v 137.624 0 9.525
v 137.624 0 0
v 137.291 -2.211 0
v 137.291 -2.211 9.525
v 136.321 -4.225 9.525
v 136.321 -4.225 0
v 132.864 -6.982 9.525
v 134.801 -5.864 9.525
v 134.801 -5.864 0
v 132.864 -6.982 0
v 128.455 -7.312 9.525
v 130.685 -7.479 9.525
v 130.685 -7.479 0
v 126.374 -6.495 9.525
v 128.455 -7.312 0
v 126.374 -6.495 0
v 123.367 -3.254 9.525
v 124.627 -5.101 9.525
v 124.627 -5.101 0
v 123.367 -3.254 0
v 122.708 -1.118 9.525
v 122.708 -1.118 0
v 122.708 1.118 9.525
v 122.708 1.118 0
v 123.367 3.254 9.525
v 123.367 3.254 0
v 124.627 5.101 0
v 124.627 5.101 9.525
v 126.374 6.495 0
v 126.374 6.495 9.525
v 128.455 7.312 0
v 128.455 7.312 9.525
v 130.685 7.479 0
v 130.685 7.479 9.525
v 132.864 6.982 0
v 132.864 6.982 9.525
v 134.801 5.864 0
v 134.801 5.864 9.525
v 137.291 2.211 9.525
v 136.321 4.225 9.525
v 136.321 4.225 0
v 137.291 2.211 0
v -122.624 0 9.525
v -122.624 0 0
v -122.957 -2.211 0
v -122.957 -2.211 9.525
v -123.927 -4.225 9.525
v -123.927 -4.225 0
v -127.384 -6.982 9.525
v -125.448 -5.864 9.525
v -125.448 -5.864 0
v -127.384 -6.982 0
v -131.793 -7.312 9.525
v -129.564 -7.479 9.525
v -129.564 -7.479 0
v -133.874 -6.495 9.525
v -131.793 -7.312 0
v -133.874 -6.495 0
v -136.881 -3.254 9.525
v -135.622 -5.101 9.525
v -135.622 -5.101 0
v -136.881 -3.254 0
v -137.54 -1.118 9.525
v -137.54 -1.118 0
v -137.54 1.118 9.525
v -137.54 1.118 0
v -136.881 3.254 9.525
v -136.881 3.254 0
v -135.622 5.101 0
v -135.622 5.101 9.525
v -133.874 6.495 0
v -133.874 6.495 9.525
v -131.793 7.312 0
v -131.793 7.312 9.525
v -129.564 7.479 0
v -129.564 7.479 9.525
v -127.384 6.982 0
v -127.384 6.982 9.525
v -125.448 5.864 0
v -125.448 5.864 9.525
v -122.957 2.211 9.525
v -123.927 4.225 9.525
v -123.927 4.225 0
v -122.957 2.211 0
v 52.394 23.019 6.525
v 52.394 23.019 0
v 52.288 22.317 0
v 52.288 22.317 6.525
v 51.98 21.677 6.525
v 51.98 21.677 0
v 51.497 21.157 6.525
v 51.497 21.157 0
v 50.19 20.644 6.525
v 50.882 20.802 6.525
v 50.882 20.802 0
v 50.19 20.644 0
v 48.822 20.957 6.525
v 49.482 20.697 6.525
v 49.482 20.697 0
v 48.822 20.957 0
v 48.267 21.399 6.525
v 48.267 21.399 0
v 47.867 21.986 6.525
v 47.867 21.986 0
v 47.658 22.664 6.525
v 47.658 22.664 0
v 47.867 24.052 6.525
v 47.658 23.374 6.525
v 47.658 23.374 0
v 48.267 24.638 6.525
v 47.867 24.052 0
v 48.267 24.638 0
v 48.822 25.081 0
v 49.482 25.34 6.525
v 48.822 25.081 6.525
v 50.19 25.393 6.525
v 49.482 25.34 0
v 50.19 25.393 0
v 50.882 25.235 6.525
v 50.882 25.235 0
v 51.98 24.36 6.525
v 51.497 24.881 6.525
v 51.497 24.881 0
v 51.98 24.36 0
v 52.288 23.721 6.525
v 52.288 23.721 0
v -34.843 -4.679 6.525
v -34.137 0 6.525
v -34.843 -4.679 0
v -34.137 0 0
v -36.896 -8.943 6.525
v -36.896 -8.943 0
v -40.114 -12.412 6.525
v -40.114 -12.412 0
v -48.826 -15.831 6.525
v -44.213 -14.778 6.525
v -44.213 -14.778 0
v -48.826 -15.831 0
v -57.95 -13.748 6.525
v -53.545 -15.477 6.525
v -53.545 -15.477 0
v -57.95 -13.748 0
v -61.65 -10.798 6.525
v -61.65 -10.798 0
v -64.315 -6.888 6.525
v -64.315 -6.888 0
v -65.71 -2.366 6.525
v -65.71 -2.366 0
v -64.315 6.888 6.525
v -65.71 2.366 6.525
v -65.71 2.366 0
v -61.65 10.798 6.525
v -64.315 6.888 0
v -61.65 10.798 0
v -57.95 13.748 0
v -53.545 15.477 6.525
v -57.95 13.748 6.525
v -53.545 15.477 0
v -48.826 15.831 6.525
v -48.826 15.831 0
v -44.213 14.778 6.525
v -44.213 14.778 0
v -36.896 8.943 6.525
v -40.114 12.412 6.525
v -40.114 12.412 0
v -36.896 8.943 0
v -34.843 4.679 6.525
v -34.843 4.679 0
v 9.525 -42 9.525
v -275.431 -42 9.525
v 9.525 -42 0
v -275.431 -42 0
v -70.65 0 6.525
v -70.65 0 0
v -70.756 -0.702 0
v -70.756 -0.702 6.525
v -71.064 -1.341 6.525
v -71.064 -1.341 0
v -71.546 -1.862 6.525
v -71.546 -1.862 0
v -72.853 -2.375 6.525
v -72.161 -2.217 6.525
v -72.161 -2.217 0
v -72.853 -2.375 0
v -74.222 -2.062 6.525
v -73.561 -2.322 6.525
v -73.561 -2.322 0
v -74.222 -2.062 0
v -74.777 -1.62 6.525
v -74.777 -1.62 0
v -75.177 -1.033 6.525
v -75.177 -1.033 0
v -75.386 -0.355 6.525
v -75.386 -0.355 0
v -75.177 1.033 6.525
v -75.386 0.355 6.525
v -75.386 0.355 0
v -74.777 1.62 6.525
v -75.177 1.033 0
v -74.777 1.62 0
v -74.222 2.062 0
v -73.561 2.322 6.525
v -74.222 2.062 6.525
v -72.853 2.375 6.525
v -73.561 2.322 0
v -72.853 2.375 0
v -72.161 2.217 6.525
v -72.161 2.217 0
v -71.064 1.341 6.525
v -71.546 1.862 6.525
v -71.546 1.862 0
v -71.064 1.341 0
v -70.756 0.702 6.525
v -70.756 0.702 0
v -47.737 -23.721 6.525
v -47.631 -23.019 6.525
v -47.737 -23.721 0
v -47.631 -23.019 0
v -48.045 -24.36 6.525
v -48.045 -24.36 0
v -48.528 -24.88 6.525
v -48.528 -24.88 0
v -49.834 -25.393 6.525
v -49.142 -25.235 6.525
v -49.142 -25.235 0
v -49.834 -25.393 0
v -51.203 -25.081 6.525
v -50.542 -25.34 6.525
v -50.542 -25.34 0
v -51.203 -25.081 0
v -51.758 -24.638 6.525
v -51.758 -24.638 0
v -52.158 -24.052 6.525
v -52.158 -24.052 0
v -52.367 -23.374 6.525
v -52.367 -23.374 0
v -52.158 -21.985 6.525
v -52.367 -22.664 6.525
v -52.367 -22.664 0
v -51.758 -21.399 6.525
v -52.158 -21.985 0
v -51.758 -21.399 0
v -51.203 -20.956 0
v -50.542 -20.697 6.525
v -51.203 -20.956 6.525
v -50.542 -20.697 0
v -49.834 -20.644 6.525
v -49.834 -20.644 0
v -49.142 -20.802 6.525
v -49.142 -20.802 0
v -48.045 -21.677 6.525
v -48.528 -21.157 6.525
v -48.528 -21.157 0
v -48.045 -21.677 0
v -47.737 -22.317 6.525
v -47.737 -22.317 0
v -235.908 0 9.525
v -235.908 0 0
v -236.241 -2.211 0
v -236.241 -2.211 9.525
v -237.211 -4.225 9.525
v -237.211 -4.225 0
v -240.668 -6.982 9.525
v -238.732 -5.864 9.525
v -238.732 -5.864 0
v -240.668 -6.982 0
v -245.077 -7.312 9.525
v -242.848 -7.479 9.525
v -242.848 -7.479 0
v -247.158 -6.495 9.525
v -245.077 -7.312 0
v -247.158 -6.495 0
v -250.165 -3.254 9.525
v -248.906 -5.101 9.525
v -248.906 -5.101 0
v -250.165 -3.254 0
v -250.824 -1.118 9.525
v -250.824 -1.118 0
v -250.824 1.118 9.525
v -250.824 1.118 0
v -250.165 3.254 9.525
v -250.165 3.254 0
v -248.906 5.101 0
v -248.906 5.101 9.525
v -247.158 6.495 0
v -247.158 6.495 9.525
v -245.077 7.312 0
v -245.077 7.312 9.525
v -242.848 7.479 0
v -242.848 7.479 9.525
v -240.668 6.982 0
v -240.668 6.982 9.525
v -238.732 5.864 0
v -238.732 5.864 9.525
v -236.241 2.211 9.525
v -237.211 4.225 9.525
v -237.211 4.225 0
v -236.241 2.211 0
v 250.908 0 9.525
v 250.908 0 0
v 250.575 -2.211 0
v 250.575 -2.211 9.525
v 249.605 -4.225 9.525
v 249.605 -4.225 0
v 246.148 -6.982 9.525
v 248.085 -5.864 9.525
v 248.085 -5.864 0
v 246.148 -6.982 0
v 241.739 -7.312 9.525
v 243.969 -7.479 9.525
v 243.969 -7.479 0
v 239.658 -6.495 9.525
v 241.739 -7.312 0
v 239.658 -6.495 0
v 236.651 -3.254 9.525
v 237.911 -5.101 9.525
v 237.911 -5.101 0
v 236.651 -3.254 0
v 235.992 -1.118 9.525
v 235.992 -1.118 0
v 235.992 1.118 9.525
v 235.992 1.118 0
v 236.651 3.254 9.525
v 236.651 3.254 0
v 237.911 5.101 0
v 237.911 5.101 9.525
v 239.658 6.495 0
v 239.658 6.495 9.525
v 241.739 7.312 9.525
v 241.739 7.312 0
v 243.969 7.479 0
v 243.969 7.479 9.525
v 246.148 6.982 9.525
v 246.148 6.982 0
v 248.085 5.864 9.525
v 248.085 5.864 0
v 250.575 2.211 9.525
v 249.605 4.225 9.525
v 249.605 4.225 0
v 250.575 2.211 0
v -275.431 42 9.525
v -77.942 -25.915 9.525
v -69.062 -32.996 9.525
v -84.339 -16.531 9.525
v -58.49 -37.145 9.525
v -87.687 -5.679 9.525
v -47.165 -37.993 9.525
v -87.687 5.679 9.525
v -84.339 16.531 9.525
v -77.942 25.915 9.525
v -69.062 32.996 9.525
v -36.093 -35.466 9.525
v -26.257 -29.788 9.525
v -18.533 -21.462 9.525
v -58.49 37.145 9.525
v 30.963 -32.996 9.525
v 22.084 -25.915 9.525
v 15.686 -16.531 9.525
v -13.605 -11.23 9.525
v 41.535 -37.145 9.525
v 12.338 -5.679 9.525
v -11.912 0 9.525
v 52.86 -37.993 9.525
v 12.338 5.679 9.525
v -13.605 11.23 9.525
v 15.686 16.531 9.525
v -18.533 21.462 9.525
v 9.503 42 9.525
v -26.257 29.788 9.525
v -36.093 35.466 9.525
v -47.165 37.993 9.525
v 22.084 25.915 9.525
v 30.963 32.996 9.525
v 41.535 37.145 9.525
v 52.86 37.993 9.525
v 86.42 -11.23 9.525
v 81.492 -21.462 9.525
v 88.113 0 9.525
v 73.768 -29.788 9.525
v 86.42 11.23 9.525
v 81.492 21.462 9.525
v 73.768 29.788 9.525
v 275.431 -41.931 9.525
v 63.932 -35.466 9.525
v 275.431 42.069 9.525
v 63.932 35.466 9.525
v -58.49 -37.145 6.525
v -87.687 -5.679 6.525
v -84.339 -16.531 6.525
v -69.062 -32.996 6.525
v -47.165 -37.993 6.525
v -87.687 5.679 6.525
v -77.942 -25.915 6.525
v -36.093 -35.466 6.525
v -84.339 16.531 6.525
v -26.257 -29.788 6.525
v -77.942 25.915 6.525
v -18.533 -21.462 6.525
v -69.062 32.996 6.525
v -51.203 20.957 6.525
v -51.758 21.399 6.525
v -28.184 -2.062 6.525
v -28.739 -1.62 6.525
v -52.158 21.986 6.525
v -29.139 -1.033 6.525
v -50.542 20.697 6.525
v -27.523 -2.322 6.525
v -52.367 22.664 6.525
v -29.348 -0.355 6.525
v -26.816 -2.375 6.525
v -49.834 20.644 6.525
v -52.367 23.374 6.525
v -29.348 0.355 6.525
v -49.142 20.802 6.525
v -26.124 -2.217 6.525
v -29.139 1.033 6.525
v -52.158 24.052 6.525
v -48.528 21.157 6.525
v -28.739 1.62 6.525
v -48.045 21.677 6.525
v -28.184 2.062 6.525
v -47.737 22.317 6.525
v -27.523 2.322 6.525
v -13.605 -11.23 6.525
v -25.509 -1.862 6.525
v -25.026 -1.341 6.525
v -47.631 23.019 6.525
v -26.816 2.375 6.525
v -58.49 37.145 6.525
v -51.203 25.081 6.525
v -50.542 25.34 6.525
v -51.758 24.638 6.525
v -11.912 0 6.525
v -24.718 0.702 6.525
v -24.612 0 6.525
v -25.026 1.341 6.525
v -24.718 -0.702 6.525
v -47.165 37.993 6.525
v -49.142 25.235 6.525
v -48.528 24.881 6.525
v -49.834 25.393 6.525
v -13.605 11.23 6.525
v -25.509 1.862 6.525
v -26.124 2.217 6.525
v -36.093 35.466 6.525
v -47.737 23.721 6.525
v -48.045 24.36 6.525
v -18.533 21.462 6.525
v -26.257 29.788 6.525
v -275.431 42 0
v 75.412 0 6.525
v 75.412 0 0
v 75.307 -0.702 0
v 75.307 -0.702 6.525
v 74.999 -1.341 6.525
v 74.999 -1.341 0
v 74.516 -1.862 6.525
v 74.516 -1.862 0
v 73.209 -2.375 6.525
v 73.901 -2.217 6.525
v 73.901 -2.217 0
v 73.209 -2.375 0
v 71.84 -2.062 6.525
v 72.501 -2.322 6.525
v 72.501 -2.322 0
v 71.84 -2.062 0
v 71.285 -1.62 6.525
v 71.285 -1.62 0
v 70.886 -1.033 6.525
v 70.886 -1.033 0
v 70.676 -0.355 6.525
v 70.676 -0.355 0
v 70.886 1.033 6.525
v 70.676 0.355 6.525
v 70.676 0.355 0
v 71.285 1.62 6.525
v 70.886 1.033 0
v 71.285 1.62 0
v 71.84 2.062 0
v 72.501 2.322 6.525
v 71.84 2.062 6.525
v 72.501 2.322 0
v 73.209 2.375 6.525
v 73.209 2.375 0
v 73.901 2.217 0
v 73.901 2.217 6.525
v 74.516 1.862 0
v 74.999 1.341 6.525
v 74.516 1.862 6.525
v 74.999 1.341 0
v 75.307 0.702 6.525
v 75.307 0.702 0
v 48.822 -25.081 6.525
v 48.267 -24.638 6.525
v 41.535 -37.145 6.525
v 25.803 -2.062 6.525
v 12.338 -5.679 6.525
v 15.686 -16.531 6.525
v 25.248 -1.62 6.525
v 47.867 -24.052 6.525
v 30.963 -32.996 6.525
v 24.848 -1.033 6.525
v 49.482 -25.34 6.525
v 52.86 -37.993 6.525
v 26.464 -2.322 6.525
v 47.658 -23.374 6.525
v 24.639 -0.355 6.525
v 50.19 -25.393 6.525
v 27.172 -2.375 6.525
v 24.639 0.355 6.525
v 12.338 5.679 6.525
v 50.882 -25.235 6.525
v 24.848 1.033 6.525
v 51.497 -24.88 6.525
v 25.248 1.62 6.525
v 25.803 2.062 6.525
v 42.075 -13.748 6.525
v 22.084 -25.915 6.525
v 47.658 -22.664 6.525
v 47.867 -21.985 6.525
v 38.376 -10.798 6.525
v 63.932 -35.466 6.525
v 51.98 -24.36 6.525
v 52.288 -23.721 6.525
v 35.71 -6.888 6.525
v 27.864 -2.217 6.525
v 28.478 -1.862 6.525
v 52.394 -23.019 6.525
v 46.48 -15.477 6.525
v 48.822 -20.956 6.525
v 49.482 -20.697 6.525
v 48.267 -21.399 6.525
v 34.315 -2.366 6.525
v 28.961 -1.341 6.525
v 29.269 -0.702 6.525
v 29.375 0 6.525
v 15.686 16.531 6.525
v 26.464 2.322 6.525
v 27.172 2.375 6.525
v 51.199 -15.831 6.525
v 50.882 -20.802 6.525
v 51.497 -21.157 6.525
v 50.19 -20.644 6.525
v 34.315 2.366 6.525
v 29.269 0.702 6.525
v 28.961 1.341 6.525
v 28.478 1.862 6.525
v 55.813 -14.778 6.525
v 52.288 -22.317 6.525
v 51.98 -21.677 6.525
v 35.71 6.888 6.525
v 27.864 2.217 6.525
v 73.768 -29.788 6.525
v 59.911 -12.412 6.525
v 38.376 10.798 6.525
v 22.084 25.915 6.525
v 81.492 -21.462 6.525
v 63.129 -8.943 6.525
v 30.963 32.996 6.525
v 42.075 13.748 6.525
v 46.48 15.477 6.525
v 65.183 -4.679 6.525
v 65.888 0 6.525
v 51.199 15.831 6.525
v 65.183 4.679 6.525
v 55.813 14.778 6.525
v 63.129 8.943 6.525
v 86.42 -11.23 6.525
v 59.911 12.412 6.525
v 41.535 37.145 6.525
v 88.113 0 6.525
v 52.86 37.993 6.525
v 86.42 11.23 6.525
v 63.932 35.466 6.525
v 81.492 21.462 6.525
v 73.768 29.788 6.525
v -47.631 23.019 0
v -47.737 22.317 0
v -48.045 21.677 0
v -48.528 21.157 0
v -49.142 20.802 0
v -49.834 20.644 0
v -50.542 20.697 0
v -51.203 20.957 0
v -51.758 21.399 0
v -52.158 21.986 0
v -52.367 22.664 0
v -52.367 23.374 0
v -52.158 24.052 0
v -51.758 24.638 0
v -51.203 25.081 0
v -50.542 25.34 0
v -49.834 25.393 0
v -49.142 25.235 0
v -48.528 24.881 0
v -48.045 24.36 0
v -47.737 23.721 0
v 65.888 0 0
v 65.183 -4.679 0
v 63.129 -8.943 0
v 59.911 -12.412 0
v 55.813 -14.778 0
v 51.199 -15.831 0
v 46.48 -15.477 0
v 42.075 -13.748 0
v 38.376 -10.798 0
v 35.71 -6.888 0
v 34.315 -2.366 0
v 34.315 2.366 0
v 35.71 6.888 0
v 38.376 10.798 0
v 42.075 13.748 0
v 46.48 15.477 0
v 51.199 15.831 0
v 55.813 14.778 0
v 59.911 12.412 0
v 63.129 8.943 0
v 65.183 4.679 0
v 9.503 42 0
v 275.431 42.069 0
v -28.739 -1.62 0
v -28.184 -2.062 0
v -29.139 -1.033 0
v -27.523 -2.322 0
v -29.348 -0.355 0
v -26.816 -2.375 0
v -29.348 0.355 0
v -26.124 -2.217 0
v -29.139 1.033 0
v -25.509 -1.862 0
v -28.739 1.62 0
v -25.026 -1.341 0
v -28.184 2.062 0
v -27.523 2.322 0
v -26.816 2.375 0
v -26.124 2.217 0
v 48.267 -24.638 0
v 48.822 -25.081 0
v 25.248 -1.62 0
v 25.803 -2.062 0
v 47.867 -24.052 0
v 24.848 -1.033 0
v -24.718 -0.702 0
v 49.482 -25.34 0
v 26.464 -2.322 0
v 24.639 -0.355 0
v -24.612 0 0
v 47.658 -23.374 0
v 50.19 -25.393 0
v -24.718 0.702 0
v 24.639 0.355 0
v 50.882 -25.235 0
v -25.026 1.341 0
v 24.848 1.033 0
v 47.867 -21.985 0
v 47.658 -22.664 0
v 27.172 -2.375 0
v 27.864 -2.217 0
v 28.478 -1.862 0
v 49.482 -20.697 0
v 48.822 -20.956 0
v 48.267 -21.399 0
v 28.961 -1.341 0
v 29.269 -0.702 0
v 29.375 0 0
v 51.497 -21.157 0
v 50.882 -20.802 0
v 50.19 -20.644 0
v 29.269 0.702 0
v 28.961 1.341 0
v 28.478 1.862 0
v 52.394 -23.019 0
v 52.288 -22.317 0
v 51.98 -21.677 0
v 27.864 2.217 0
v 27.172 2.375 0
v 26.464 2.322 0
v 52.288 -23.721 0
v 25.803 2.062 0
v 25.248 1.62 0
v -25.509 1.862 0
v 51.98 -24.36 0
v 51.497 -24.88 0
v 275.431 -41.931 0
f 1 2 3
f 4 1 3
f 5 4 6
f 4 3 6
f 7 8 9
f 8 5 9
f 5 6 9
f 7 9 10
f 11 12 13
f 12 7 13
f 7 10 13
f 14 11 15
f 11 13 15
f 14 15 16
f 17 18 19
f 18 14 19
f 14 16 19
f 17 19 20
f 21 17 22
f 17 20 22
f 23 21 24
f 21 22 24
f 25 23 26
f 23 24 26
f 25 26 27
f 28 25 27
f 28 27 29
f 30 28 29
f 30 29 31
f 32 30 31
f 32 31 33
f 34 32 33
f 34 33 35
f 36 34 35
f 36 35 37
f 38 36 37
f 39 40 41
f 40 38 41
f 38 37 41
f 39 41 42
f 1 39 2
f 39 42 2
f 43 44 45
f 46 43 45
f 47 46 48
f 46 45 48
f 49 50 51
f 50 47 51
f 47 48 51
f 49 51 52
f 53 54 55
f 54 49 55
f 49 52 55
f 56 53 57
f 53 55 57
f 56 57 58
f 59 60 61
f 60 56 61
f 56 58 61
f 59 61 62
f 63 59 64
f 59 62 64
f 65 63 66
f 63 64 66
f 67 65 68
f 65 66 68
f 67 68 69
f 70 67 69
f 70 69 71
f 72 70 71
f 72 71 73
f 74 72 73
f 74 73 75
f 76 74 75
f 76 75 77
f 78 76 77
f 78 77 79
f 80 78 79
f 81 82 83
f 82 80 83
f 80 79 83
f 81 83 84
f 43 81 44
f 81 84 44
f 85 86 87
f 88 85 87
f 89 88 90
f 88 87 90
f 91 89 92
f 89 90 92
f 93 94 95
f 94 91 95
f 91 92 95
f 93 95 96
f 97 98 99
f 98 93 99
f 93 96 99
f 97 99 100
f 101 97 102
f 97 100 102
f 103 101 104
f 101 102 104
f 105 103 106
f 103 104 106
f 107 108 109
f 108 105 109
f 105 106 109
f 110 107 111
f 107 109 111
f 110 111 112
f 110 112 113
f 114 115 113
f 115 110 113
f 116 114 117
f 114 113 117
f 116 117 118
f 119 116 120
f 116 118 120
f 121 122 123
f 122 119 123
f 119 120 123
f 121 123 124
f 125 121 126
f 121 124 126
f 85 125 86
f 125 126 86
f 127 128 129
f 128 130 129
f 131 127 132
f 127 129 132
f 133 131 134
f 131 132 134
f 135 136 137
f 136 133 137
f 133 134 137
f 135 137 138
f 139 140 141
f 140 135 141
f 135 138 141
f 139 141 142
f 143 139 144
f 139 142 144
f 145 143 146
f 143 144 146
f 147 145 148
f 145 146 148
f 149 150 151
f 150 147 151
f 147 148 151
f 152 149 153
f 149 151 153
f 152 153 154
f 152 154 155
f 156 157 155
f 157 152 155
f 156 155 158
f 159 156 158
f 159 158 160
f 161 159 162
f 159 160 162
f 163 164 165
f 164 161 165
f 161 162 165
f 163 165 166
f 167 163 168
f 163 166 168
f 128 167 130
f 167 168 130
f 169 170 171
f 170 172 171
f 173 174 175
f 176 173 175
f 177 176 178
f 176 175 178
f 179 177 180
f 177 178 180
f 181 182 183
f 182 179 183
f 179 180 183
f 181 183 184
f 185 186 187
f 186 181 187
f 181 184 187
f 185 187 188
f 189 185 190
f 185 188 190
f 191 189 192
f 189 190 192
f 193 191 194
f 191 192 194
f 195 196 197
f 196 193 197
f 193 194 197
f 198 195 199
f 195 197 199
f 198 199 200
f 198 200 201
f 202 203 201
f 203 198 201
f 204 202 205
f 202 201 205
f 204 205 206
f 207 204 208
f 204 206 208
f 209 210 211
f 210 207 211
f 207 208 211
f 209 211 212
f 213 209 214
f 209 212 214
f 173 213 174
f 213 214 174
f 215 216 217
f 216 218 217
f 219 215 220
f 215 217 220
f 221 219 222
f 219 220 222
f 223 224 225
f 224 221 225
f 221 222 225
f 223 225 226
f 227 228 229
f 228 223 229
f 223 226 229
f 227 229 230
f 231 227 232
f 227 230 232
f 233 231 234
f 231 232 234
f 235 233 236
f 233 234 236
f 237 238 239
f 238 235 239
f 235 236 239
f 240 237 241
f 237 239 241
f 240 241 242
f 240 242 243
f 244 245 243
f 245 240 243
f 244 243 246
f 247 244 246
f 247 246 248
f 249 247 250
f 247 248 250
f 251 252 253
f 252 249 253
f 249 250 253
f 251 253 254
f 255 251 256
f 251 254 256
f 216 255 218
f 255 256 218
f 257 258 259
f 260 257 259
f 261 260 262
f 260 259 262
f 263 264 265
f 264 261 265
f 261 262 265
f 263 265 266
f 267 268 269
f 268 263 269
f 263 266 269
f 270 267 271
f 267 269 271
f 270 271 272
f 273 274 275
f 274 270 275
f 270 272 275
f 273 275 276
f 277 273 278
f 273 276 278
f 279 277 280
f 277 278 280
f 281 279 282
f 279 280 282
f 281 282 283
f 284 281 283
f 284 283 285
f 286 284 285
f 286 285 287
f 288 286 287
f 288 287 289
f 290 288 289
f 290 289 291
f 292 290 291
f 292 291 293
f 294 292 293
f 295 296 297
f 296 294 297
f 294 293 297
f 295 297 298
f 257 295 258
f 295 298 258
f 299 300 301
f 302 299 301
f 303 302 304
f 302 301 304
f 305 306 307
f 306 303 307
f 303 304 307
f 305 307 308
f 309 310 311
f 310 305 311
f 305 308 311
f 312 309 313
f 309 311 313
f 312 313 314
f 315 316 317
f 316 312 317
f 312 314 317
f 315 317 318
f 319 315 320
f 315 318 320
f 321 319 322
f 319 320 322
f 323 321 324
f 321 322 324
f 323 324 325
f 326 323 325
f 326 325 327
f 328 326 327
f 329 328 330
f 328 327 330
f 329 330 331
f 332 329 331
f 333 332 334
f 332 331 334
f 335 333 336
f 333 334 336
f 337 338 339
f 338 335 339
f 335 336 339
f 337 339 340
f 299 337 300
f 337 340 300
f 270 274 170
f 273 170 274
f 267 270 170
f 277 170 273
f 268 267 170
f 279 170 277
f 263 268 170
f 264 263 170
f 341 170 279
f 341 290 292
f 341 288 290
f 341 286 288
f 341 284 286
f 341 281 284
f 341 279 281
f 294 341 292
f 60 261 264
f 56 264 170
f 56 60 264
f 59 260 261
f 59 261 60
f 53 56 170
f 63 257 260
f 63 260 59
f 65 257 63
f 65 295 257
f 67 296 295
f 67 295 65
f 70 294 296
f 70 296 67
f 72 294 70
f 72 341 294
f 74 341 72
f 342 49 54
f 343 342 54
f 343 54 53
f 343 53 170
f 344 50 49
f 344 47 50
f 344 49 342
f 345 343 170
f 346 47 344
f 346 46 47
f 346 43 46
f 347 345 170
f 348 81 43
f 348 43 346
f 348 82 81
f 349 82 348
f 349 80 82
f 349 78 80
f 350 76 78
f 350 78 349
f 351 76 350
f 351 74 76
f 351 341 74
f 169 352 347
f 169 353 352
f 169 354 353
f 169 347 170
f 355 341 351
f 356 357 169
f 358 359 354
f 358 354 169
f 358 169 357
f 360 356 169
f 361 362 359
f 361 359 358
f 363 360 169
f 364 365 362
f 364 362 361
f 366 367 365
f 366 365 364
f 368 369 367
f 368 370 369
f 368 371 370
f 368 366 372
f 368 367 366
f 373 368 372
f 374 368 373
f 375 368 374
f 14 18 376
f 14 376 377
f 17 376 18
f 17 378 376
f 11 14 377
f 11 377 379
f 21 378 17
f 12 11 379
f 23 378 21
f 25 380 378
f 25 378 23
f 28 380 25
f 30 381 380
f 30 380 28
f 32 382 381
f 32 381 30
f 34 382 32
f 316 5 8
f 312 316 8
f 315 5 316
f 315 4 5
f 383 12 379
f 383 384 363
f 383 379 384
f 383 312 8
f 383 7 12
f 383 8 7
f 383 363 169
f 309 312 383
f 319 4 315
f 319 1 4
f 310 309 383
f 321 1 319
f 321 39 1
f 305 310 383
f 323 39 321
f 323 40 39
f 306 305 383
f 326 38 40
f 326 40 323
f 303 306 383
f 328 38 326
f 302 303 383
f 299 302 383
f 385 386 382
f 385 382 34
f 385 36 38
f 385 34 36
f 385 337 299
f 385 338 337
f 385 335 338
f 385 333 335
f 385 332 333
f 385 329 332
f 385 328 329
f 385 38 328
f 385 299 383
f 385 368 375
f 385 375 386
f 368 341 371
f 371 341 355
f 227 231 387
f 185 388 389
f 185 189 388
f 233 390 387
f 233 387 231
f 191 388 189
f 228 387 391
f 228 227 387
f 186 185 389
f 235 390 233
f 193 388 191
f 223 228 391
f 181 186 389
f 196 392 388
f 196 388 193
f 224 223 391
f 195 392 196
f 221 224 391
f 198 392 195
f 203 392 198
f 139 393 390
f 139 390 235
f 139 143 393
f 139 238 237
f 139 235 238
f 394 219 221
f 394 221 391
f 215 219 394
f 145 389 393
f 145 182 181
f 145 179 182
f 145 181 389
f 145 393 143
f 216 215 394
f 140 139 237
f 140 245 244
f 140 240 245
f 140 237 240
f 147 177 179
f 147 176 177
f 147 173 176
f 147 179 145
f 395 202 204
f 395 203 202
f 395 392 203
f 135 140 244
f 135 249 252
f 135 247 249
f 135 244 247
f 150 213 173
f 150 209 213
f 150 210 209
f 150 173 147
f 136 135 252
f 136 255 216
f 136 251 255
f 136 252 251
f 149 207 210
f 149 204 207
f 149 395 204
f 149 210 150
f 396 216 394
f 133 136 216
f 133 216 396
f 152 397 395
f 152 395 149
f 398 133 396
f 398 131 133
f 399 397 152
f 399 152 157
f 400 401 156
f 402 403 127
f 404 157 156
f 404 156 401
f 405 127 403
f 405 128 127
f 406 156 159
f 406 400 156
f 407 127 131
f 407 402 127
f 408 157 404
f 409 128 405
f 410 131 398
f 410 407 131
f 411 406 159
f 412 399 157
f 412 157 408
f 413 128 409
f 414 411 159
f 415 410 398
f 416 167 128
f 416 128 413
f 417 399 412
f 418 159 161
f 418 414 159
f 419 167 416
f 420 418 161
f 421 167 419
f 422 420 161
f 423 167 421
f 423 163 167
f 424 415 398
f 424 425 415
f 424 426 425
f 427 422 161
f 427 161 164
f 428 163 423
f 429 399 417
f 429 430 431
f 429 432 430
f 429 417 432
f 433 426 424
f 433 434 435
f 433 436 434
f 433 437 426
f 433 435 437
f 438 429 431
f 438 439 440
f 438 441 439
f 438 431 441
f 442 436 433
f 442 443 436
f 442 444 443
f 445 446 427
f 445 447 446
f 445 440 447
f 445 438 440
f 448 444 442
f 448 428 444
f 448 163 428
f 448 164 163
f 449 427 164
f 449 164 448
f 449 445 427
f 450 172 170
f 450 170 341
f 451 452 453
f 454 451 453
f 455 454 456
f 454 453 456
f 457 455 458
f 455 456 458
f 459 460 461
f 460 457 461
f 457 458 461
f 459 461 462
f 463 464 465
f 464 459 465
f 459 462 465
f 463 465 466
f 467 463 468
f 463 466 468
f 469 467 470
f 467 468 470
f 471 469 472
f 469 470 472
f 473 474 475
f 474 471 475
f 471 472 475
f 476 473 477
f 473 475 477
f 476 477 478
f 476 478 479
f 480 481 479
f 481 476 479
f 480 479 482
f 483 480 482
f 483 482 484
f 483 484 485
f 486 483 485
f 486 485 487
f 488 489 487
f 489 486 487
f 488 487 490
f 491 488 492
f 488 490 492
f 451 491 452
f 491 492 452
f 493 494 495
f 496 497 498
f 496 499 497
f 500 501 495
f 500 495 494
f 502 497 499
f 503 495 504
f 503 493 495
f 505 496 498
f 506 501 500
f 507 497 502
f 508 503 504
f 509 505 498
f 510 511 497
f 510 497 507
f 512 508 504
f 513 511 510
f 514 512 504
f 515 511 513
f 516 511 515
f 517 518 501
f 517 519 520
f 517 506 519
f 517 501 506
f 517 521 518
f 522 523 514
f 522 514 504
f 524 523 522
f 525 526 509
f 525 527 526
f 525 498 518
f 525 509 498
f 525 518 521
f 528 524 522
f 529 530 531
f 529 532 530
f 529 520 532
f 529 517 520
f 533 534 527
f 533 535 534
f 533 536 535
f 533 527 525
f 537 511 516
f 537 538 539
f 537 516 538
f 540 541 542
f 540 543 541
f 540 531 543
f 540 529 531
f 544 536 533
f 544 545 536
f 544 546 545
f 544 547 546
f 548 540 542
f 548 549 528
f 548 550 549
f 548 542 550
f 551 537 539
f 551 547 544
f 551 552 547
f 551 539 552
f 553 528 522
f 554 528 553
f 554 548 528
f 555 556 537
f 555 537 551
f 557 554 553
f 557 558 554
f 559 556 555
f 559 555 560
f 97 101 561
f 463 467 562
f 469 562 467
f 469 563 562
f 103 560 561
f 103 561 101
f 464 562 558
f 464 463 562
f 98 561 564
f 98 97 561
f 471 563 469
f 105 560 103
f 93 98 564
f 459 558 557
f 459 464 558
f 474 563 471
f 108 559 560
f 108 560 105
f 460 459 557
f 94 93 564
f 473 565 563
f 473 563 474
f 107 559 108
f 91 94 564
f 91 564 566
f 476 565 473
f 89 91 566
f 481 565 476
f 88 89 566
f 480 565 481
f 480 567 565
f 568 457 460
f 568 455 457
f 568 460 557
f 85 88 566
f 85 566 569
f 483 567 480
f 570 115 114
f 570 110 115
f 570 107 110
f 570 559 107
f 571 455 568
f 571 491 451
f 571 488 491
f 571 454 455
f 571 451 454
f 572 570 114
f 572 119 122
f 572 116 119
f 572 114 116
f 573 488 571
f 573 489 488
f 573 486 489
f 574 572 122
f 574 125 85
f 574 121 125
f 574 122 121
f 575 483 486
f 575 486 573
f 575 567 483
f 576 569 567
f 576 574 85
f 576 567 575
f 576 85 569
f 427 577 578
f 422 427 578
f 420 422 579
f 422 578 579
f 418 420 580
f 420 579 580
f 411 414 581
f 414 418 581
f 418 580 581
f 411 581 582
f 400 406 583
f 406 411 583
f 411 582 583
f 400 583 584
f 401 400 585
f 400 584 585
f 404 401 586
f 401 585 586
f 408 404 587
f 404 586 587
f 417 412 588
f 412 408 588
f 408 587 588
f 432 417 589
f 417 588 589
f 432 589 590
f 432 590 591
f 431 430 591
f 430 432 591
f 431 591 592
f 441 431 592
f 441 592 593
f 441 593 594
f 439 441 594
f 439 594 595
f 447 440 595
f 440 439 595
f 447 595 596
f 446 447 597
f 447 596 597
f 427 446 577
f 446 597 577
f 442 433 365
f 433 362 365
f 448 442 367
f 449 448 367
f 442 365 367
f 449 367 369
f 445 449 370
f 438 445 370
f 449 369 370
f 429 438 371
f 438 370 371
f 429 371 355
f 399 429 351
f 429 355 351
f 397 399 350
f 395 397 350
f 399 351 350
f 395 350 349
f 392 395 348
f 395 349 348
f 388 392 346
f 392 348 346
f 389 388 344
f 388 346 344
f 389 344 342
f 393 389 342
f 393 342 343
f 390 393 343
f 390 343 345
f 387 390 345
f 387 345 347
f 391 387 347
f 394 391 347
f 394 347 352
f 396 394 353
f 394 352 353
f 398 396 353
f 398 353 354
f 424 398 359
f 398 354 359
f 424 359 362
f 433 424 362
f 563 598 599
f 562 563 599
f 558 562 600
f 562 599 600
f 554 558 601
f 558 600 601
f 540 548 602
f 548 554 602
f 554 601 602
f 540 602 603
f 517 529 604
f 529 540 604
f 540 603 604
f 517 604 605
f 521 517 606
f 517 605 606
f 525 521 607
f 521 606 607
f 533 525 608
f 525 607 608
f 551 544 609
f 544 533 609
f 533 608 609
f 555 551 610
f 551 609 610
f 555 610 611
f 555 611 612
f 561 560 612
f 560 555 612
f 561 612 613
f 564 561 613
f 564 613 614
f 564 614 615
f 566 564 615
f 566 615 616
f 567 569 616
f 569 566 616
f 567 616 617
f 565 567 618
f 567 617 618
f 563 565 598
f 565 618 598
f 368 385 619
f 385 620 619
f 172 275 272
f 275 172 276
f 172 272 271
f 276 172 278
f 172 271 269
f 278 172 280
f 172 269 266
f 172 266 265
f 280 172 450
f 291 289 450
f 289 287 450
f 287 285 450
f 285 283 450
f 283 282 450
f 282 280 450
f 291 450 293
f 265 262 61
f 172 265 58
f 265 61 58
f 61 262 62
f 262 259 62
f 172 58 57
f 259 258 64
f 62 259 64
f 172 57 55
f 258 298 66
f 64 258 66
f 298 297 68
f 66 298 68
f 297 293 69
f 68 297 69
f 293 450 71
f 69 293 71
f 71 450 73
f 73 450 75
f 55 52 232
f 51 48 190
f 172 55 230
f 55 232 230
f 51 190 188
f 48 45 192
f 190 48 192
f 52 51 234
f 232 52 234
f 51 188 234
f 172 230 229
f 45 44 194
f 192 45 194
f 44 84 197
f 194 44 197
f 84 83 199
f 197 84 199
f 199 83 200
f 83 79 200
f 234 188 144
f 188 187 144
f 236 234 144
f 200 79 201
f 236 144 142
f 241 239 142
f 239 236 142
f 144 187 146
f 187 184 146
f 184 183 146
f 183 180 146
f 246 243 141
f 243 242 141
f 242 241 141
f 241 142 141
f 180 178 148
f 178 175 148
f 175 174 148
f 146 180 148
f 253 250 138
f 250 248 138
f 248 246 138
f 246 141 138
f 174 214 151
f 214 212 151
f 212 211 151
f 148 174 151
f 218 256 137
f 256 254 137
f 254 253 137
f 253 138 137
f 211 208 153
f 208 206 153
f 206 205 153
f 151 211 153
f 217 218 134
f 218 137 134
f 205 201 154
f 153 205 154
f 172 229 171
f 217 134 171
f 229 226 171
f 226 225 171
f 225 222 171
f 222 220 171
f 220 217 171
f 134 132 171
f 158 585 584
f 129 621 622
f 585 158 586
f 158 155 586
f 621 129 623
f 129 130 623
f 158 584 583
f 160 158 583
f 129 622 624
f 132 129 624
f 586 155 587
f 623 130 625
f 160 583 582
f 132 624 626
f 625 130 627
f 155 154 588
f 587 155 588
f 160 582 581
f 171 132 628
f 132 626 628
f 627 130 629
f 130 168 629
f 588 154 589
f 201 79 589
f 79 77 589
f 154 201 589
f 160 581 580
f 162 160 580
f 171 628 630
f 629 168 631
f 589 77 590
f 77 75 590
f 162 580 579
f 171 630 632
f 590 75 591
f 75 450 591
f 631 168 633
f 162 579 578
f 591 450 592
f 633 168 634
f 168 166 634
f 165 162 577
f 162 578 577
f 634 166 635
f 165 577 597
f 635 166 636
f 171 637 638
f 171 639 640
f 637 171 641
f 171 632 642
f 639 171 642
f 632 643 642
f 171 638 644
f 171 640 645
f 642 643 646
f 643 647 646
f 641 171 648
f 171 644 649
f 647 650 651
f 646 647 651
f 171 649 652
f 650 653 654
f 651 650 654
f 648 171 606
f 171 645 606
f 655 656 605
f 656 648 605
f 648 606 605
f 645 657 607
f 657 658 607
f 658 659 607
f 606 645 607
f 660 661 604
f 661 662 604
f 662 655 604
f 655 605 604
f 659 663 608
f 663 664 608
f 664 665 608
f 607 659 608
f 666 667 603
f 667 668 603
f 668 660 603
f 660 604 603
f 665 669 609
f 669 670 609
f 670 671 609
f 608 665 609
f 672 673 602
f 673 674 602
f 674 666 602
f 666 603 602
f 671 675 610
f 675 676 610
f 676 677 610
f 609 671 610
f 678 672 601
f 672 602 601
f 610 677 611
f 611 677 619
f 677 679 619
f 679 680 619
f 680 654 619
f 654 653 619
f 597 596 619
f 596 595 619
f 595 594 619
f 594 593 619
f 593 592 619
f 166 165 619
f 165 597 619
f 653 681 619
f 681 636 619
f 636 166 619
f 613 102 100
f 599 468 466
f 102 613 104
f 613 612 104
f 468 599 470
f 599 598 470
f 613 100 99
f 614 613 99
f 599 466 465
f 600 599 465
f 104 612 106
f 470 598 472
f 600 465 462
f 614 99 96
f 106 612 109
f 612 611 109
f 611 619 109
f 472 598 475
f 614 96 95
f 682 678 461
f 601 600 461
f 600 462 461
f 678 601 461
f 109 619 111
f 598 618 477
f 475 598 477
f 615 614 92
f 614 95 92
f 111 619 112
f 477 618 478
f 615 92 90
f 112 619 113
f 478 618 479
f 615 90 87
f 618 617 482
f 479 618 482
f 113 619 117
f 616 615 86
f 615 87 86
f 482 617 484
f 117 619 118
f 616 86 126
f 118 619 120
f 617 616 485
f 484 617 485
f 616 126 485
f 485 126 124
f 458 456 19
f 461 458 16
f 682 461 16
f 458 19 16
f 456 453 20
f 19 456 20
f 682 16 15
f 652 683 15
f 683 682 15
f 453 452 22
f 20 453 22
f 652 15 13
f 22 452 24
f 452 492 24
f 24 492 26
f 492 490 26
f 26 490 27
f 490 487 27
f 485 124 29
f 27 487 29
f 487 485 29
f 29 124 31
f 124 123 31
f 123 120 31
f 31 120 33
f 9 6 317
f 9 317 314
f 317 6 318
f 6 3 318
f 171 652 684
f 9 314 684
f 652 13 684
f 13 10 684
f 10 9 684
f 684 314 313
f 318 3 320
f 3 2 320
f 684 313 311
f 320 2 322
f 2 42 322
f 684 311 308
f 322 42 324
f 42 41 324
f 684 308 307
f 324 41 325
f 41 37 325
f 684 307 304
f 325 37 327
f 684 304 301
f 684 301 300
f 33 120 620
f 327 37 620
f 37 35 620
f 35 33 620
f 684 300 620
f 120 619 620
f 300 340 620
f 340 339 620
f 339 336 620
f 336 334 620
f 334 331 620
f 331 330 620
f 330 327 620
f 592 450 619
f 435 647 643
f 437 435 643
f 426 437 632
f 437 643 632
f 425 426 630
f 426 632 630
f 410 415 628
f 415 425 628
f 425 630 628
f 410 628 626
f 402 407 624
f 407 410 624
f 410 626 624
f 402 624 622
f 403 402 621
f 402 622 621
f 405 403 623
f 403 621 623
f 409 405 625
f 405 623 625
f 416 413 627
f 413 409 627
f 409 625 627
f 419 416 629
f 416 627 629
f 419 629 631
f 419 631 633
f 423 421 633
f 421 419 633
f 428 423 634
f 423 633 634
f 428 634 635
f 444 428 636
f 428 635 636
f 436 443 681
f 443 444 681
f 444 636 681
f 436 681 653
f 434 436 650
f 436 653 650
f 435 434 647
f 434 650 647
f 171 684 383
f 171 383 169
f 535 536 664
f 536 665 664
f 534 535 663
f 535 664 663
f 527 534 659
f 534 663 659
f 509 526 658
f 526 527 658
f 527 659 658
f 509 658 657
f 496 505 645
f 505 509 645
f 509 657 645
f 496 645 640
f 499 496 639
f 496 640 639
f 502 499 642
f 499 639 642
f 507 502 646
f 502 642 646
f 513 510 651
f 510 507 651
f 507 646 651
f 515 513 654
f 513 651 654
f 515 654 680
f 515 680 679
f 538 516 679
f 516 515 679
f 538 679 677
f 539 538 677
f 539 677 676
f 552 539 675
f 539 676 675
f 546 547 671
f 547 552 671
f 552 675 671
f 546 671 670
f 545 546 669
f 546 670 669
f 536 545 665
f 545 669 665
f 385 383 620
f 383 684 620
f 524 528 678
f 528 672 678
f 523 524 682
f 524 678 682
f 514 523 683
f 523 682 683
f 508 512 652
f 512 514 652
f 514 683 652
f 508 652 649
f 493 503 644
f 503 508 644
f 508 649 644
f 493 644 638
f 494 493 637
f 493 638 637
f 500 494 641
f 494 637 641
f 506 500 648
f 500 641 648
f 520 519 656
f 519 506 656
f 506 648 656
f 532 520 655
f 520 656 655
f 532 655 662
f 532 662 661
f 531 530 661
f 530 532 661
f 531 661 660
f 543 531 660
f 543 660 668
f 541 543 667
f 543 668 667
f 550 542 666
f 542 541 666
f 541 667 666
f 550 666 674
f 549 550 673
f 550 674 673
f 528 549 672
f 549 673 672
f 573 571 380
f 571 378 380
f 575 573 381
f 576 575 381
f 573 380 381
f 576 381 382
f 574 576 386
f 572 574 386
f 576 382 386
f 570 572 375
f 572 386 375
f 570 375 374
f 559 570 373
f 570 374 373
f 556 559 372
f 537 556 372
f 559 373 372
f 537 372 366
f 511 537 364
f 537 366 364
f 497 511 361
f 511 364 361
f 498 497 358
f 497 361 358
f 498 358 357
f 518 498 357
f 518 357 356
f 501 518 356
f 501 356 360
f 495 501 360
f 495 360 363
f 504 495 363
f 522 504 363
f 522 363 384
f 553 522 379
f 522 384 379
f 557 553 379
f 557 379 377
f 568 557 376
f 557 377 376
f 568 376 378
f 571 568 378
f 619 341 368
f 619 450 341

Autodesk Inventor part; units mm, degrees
ref_plane "YZ Plane" through (0, 0, 0) normal (1, 0, 0) x (0, 1, 0)
ref_plane "XZ Plane" through (0, 0, 0) normal (0, 1, 0) x (-1, 0, 0)
ref_plane "XY Plane" through (0, 0, 0) normal (0, 0, 1) x (1, 0, 0)
sketch "Sketch1" plane through (0, 0, 0) normal (0, 0, 1) x (1, 0, 0)
  line L0 (-275.4313, -42) -> (-275.4313, 42)
  circle A0 centre (-243.408, 0) radius 7.5
  circle A1 centre (-130.124, 0) radius 7.5
  circle A2 centre (-50.0124, 0) radius 15.875
  circle A3 centre (-50.0124, 23.0188) radius 2.3813
  circle A4 centre (-26.9936, 0) radius 2.3813
  circle A5 centre (-73.0311, 0) radius 2.3813
  circle A6 centre (-50.0124, -23.0187) radius 2.3813
  line L1 (-275.4313, 42) -> (9.5034, 42)
  line L2 (-275.4313, -42) -> (9.5252, -42)
  line L3 (275.4312, -41.9309) -> (275.4312, 42.0691)
  line L4 (275.4312, 42.0691) -> (9.5034, 42)
  line L5 (275.4312, -41.9309) -> (9.5252, -42)
  circle A7 centre (-50.0124, 0) radius 38.1
  circle A8 centre (243.4084, 0) radius 7.5
  circle A9 centre (130.1244, 0) radius 7.5
  circle A10 centre (50.0128, 0) radius 15.875
  circle A11 centre (50.0123, 23.0188) radius 2.3813
  circle A12 centre (26.9936, 0) radius 2.3813
  circle A13 centre (73.0311, 0) radius 2.3813
  circle A14 centre (50.0123, -23.0187) radius 2.3813
  circle A15 centre (50.0128, 0) radius 38.1
  dimension "d4" = 15
  dimension "d7" = 15
  dimension "d9" = 31.75
  dimension "d11" = 4.7625
  dimension "d13" = 4.7625
  dimension "d15" = 23.0188
  dimension "d16" = 4.7625
  dimension "d18" = 4.7625
  dimension "d25" = 550.8625
  dimension "d50" = 23.0188
  dimension "d51" = 23.0188
  dimension "d52" = 23.0188
  dimension "d53" = 80.1116
  dimension "d54" = 113.284
  dimension "d62" = 76.2
  dimension "d88" = 84
  dimension "d89" = 42
  dimension "d90" = 42
  dimension "d91" = 32.0233
  dimension "d92" = 42
  dimension "d93" = 42
  dimension "d97" = 100.0252
  dimension "d98" = 80.1116
  dimension "d99" = 113.284
  dimension "d100" = 32.0228
extrude "Extrusion4" add sketch "Sketch1" along normal blind 9.525 contours L0 L1 L4 L3 L5 L2 | A7 | A15
sketch "Sketch5" plane through (0, 0, 9.525) normal (0, 0, 1) x (1, 0, 0)
  line L0 (-275.4313, -42) -> (-275.4313, 42)
  circle A0 centre (-243.408, 0) radius 7.5
  circle A1 centre (-130.124, 0) radius 7.5
  circle A2 centre (-50.0124, 0) radius 15.875
  circle A3 centre (-50.0124, 23.0188) radius 2.3813
  circle A4 centre (-26.9936, 0) radius 2.3813
  circle A5 centre (-73.0311, 0) radius 2.3813
  circle A6 centre (-50.0124, -23.0187) radius 2.3813
  line L1 (-275.4313, 42) -> (9.5034, 42)
  line L2 (-275.4313, -42) -> (9.5143, -42)
  line L3 (275.4312, -41.9309) -> (9.5143, -42)
  line L4 (275.4312, 42.0691) -> (9.5034, 42)
  line L5 (275.4312, -41.9309) -> (275.4312, 42.0691)
  circle A7 centre (-50.0124, 0) radius 38.1
  circle A8 centre (50.0123, -23.0187) radius 2.3813
  circle A9 centre (50.0123, 23.0188) radius 2.3813
  circle A10 centre (26.9936, 0) radius 2.3813
  circle A11 centre (50.0128, 0) radius 15.875
  circle A12 centre (73.0311, 0) radius 2.3813
  circle A13 centre (50.0128, 0) radius 38.1
  circle A14 centre (130.1244, 0) radius 7.5
  circle A15 centre (243.4084, 0) radius 7.5
  point P0 (0, 0)
  dimension "d103" = 15
  dimension "d104" = 15
  dimension "d105" = 31.75
  dimension "d106" = 4.7625
  dimension "d107" = 4.7625
  dimension "d108" = 23.0188
  dimension "d109" = 4.7625
  dimension "d110" = 4.7625
  dimension "d111" = 550.8625
  dimension "d112" = 23.0188
  dimension "d113" = 23.0188
  dimension "d114" = 23.0188
  dimension "d115" = 80.1116
  dimension "d116" = 113.284
  dimension "d117" = 76.2
  dimension "d118" = 84
  dimension "d119" = 42
  dimension "d120" = 42
  dimension "d121" = 32.0233
  dimension "d122" = 42
  dimension "d123" = 42
  dimension "d124" = 100.0252
  dimension "d125" = 80.1116
  dimension "d126" = 113.284
  dimension "d127" = 32.0228
emboss "Emboss4" sketch "Sketch5" operation cut depth 3 direction (0, 0, -1) contours A7 | A13
properties part number "Drivetrainsideinside"
